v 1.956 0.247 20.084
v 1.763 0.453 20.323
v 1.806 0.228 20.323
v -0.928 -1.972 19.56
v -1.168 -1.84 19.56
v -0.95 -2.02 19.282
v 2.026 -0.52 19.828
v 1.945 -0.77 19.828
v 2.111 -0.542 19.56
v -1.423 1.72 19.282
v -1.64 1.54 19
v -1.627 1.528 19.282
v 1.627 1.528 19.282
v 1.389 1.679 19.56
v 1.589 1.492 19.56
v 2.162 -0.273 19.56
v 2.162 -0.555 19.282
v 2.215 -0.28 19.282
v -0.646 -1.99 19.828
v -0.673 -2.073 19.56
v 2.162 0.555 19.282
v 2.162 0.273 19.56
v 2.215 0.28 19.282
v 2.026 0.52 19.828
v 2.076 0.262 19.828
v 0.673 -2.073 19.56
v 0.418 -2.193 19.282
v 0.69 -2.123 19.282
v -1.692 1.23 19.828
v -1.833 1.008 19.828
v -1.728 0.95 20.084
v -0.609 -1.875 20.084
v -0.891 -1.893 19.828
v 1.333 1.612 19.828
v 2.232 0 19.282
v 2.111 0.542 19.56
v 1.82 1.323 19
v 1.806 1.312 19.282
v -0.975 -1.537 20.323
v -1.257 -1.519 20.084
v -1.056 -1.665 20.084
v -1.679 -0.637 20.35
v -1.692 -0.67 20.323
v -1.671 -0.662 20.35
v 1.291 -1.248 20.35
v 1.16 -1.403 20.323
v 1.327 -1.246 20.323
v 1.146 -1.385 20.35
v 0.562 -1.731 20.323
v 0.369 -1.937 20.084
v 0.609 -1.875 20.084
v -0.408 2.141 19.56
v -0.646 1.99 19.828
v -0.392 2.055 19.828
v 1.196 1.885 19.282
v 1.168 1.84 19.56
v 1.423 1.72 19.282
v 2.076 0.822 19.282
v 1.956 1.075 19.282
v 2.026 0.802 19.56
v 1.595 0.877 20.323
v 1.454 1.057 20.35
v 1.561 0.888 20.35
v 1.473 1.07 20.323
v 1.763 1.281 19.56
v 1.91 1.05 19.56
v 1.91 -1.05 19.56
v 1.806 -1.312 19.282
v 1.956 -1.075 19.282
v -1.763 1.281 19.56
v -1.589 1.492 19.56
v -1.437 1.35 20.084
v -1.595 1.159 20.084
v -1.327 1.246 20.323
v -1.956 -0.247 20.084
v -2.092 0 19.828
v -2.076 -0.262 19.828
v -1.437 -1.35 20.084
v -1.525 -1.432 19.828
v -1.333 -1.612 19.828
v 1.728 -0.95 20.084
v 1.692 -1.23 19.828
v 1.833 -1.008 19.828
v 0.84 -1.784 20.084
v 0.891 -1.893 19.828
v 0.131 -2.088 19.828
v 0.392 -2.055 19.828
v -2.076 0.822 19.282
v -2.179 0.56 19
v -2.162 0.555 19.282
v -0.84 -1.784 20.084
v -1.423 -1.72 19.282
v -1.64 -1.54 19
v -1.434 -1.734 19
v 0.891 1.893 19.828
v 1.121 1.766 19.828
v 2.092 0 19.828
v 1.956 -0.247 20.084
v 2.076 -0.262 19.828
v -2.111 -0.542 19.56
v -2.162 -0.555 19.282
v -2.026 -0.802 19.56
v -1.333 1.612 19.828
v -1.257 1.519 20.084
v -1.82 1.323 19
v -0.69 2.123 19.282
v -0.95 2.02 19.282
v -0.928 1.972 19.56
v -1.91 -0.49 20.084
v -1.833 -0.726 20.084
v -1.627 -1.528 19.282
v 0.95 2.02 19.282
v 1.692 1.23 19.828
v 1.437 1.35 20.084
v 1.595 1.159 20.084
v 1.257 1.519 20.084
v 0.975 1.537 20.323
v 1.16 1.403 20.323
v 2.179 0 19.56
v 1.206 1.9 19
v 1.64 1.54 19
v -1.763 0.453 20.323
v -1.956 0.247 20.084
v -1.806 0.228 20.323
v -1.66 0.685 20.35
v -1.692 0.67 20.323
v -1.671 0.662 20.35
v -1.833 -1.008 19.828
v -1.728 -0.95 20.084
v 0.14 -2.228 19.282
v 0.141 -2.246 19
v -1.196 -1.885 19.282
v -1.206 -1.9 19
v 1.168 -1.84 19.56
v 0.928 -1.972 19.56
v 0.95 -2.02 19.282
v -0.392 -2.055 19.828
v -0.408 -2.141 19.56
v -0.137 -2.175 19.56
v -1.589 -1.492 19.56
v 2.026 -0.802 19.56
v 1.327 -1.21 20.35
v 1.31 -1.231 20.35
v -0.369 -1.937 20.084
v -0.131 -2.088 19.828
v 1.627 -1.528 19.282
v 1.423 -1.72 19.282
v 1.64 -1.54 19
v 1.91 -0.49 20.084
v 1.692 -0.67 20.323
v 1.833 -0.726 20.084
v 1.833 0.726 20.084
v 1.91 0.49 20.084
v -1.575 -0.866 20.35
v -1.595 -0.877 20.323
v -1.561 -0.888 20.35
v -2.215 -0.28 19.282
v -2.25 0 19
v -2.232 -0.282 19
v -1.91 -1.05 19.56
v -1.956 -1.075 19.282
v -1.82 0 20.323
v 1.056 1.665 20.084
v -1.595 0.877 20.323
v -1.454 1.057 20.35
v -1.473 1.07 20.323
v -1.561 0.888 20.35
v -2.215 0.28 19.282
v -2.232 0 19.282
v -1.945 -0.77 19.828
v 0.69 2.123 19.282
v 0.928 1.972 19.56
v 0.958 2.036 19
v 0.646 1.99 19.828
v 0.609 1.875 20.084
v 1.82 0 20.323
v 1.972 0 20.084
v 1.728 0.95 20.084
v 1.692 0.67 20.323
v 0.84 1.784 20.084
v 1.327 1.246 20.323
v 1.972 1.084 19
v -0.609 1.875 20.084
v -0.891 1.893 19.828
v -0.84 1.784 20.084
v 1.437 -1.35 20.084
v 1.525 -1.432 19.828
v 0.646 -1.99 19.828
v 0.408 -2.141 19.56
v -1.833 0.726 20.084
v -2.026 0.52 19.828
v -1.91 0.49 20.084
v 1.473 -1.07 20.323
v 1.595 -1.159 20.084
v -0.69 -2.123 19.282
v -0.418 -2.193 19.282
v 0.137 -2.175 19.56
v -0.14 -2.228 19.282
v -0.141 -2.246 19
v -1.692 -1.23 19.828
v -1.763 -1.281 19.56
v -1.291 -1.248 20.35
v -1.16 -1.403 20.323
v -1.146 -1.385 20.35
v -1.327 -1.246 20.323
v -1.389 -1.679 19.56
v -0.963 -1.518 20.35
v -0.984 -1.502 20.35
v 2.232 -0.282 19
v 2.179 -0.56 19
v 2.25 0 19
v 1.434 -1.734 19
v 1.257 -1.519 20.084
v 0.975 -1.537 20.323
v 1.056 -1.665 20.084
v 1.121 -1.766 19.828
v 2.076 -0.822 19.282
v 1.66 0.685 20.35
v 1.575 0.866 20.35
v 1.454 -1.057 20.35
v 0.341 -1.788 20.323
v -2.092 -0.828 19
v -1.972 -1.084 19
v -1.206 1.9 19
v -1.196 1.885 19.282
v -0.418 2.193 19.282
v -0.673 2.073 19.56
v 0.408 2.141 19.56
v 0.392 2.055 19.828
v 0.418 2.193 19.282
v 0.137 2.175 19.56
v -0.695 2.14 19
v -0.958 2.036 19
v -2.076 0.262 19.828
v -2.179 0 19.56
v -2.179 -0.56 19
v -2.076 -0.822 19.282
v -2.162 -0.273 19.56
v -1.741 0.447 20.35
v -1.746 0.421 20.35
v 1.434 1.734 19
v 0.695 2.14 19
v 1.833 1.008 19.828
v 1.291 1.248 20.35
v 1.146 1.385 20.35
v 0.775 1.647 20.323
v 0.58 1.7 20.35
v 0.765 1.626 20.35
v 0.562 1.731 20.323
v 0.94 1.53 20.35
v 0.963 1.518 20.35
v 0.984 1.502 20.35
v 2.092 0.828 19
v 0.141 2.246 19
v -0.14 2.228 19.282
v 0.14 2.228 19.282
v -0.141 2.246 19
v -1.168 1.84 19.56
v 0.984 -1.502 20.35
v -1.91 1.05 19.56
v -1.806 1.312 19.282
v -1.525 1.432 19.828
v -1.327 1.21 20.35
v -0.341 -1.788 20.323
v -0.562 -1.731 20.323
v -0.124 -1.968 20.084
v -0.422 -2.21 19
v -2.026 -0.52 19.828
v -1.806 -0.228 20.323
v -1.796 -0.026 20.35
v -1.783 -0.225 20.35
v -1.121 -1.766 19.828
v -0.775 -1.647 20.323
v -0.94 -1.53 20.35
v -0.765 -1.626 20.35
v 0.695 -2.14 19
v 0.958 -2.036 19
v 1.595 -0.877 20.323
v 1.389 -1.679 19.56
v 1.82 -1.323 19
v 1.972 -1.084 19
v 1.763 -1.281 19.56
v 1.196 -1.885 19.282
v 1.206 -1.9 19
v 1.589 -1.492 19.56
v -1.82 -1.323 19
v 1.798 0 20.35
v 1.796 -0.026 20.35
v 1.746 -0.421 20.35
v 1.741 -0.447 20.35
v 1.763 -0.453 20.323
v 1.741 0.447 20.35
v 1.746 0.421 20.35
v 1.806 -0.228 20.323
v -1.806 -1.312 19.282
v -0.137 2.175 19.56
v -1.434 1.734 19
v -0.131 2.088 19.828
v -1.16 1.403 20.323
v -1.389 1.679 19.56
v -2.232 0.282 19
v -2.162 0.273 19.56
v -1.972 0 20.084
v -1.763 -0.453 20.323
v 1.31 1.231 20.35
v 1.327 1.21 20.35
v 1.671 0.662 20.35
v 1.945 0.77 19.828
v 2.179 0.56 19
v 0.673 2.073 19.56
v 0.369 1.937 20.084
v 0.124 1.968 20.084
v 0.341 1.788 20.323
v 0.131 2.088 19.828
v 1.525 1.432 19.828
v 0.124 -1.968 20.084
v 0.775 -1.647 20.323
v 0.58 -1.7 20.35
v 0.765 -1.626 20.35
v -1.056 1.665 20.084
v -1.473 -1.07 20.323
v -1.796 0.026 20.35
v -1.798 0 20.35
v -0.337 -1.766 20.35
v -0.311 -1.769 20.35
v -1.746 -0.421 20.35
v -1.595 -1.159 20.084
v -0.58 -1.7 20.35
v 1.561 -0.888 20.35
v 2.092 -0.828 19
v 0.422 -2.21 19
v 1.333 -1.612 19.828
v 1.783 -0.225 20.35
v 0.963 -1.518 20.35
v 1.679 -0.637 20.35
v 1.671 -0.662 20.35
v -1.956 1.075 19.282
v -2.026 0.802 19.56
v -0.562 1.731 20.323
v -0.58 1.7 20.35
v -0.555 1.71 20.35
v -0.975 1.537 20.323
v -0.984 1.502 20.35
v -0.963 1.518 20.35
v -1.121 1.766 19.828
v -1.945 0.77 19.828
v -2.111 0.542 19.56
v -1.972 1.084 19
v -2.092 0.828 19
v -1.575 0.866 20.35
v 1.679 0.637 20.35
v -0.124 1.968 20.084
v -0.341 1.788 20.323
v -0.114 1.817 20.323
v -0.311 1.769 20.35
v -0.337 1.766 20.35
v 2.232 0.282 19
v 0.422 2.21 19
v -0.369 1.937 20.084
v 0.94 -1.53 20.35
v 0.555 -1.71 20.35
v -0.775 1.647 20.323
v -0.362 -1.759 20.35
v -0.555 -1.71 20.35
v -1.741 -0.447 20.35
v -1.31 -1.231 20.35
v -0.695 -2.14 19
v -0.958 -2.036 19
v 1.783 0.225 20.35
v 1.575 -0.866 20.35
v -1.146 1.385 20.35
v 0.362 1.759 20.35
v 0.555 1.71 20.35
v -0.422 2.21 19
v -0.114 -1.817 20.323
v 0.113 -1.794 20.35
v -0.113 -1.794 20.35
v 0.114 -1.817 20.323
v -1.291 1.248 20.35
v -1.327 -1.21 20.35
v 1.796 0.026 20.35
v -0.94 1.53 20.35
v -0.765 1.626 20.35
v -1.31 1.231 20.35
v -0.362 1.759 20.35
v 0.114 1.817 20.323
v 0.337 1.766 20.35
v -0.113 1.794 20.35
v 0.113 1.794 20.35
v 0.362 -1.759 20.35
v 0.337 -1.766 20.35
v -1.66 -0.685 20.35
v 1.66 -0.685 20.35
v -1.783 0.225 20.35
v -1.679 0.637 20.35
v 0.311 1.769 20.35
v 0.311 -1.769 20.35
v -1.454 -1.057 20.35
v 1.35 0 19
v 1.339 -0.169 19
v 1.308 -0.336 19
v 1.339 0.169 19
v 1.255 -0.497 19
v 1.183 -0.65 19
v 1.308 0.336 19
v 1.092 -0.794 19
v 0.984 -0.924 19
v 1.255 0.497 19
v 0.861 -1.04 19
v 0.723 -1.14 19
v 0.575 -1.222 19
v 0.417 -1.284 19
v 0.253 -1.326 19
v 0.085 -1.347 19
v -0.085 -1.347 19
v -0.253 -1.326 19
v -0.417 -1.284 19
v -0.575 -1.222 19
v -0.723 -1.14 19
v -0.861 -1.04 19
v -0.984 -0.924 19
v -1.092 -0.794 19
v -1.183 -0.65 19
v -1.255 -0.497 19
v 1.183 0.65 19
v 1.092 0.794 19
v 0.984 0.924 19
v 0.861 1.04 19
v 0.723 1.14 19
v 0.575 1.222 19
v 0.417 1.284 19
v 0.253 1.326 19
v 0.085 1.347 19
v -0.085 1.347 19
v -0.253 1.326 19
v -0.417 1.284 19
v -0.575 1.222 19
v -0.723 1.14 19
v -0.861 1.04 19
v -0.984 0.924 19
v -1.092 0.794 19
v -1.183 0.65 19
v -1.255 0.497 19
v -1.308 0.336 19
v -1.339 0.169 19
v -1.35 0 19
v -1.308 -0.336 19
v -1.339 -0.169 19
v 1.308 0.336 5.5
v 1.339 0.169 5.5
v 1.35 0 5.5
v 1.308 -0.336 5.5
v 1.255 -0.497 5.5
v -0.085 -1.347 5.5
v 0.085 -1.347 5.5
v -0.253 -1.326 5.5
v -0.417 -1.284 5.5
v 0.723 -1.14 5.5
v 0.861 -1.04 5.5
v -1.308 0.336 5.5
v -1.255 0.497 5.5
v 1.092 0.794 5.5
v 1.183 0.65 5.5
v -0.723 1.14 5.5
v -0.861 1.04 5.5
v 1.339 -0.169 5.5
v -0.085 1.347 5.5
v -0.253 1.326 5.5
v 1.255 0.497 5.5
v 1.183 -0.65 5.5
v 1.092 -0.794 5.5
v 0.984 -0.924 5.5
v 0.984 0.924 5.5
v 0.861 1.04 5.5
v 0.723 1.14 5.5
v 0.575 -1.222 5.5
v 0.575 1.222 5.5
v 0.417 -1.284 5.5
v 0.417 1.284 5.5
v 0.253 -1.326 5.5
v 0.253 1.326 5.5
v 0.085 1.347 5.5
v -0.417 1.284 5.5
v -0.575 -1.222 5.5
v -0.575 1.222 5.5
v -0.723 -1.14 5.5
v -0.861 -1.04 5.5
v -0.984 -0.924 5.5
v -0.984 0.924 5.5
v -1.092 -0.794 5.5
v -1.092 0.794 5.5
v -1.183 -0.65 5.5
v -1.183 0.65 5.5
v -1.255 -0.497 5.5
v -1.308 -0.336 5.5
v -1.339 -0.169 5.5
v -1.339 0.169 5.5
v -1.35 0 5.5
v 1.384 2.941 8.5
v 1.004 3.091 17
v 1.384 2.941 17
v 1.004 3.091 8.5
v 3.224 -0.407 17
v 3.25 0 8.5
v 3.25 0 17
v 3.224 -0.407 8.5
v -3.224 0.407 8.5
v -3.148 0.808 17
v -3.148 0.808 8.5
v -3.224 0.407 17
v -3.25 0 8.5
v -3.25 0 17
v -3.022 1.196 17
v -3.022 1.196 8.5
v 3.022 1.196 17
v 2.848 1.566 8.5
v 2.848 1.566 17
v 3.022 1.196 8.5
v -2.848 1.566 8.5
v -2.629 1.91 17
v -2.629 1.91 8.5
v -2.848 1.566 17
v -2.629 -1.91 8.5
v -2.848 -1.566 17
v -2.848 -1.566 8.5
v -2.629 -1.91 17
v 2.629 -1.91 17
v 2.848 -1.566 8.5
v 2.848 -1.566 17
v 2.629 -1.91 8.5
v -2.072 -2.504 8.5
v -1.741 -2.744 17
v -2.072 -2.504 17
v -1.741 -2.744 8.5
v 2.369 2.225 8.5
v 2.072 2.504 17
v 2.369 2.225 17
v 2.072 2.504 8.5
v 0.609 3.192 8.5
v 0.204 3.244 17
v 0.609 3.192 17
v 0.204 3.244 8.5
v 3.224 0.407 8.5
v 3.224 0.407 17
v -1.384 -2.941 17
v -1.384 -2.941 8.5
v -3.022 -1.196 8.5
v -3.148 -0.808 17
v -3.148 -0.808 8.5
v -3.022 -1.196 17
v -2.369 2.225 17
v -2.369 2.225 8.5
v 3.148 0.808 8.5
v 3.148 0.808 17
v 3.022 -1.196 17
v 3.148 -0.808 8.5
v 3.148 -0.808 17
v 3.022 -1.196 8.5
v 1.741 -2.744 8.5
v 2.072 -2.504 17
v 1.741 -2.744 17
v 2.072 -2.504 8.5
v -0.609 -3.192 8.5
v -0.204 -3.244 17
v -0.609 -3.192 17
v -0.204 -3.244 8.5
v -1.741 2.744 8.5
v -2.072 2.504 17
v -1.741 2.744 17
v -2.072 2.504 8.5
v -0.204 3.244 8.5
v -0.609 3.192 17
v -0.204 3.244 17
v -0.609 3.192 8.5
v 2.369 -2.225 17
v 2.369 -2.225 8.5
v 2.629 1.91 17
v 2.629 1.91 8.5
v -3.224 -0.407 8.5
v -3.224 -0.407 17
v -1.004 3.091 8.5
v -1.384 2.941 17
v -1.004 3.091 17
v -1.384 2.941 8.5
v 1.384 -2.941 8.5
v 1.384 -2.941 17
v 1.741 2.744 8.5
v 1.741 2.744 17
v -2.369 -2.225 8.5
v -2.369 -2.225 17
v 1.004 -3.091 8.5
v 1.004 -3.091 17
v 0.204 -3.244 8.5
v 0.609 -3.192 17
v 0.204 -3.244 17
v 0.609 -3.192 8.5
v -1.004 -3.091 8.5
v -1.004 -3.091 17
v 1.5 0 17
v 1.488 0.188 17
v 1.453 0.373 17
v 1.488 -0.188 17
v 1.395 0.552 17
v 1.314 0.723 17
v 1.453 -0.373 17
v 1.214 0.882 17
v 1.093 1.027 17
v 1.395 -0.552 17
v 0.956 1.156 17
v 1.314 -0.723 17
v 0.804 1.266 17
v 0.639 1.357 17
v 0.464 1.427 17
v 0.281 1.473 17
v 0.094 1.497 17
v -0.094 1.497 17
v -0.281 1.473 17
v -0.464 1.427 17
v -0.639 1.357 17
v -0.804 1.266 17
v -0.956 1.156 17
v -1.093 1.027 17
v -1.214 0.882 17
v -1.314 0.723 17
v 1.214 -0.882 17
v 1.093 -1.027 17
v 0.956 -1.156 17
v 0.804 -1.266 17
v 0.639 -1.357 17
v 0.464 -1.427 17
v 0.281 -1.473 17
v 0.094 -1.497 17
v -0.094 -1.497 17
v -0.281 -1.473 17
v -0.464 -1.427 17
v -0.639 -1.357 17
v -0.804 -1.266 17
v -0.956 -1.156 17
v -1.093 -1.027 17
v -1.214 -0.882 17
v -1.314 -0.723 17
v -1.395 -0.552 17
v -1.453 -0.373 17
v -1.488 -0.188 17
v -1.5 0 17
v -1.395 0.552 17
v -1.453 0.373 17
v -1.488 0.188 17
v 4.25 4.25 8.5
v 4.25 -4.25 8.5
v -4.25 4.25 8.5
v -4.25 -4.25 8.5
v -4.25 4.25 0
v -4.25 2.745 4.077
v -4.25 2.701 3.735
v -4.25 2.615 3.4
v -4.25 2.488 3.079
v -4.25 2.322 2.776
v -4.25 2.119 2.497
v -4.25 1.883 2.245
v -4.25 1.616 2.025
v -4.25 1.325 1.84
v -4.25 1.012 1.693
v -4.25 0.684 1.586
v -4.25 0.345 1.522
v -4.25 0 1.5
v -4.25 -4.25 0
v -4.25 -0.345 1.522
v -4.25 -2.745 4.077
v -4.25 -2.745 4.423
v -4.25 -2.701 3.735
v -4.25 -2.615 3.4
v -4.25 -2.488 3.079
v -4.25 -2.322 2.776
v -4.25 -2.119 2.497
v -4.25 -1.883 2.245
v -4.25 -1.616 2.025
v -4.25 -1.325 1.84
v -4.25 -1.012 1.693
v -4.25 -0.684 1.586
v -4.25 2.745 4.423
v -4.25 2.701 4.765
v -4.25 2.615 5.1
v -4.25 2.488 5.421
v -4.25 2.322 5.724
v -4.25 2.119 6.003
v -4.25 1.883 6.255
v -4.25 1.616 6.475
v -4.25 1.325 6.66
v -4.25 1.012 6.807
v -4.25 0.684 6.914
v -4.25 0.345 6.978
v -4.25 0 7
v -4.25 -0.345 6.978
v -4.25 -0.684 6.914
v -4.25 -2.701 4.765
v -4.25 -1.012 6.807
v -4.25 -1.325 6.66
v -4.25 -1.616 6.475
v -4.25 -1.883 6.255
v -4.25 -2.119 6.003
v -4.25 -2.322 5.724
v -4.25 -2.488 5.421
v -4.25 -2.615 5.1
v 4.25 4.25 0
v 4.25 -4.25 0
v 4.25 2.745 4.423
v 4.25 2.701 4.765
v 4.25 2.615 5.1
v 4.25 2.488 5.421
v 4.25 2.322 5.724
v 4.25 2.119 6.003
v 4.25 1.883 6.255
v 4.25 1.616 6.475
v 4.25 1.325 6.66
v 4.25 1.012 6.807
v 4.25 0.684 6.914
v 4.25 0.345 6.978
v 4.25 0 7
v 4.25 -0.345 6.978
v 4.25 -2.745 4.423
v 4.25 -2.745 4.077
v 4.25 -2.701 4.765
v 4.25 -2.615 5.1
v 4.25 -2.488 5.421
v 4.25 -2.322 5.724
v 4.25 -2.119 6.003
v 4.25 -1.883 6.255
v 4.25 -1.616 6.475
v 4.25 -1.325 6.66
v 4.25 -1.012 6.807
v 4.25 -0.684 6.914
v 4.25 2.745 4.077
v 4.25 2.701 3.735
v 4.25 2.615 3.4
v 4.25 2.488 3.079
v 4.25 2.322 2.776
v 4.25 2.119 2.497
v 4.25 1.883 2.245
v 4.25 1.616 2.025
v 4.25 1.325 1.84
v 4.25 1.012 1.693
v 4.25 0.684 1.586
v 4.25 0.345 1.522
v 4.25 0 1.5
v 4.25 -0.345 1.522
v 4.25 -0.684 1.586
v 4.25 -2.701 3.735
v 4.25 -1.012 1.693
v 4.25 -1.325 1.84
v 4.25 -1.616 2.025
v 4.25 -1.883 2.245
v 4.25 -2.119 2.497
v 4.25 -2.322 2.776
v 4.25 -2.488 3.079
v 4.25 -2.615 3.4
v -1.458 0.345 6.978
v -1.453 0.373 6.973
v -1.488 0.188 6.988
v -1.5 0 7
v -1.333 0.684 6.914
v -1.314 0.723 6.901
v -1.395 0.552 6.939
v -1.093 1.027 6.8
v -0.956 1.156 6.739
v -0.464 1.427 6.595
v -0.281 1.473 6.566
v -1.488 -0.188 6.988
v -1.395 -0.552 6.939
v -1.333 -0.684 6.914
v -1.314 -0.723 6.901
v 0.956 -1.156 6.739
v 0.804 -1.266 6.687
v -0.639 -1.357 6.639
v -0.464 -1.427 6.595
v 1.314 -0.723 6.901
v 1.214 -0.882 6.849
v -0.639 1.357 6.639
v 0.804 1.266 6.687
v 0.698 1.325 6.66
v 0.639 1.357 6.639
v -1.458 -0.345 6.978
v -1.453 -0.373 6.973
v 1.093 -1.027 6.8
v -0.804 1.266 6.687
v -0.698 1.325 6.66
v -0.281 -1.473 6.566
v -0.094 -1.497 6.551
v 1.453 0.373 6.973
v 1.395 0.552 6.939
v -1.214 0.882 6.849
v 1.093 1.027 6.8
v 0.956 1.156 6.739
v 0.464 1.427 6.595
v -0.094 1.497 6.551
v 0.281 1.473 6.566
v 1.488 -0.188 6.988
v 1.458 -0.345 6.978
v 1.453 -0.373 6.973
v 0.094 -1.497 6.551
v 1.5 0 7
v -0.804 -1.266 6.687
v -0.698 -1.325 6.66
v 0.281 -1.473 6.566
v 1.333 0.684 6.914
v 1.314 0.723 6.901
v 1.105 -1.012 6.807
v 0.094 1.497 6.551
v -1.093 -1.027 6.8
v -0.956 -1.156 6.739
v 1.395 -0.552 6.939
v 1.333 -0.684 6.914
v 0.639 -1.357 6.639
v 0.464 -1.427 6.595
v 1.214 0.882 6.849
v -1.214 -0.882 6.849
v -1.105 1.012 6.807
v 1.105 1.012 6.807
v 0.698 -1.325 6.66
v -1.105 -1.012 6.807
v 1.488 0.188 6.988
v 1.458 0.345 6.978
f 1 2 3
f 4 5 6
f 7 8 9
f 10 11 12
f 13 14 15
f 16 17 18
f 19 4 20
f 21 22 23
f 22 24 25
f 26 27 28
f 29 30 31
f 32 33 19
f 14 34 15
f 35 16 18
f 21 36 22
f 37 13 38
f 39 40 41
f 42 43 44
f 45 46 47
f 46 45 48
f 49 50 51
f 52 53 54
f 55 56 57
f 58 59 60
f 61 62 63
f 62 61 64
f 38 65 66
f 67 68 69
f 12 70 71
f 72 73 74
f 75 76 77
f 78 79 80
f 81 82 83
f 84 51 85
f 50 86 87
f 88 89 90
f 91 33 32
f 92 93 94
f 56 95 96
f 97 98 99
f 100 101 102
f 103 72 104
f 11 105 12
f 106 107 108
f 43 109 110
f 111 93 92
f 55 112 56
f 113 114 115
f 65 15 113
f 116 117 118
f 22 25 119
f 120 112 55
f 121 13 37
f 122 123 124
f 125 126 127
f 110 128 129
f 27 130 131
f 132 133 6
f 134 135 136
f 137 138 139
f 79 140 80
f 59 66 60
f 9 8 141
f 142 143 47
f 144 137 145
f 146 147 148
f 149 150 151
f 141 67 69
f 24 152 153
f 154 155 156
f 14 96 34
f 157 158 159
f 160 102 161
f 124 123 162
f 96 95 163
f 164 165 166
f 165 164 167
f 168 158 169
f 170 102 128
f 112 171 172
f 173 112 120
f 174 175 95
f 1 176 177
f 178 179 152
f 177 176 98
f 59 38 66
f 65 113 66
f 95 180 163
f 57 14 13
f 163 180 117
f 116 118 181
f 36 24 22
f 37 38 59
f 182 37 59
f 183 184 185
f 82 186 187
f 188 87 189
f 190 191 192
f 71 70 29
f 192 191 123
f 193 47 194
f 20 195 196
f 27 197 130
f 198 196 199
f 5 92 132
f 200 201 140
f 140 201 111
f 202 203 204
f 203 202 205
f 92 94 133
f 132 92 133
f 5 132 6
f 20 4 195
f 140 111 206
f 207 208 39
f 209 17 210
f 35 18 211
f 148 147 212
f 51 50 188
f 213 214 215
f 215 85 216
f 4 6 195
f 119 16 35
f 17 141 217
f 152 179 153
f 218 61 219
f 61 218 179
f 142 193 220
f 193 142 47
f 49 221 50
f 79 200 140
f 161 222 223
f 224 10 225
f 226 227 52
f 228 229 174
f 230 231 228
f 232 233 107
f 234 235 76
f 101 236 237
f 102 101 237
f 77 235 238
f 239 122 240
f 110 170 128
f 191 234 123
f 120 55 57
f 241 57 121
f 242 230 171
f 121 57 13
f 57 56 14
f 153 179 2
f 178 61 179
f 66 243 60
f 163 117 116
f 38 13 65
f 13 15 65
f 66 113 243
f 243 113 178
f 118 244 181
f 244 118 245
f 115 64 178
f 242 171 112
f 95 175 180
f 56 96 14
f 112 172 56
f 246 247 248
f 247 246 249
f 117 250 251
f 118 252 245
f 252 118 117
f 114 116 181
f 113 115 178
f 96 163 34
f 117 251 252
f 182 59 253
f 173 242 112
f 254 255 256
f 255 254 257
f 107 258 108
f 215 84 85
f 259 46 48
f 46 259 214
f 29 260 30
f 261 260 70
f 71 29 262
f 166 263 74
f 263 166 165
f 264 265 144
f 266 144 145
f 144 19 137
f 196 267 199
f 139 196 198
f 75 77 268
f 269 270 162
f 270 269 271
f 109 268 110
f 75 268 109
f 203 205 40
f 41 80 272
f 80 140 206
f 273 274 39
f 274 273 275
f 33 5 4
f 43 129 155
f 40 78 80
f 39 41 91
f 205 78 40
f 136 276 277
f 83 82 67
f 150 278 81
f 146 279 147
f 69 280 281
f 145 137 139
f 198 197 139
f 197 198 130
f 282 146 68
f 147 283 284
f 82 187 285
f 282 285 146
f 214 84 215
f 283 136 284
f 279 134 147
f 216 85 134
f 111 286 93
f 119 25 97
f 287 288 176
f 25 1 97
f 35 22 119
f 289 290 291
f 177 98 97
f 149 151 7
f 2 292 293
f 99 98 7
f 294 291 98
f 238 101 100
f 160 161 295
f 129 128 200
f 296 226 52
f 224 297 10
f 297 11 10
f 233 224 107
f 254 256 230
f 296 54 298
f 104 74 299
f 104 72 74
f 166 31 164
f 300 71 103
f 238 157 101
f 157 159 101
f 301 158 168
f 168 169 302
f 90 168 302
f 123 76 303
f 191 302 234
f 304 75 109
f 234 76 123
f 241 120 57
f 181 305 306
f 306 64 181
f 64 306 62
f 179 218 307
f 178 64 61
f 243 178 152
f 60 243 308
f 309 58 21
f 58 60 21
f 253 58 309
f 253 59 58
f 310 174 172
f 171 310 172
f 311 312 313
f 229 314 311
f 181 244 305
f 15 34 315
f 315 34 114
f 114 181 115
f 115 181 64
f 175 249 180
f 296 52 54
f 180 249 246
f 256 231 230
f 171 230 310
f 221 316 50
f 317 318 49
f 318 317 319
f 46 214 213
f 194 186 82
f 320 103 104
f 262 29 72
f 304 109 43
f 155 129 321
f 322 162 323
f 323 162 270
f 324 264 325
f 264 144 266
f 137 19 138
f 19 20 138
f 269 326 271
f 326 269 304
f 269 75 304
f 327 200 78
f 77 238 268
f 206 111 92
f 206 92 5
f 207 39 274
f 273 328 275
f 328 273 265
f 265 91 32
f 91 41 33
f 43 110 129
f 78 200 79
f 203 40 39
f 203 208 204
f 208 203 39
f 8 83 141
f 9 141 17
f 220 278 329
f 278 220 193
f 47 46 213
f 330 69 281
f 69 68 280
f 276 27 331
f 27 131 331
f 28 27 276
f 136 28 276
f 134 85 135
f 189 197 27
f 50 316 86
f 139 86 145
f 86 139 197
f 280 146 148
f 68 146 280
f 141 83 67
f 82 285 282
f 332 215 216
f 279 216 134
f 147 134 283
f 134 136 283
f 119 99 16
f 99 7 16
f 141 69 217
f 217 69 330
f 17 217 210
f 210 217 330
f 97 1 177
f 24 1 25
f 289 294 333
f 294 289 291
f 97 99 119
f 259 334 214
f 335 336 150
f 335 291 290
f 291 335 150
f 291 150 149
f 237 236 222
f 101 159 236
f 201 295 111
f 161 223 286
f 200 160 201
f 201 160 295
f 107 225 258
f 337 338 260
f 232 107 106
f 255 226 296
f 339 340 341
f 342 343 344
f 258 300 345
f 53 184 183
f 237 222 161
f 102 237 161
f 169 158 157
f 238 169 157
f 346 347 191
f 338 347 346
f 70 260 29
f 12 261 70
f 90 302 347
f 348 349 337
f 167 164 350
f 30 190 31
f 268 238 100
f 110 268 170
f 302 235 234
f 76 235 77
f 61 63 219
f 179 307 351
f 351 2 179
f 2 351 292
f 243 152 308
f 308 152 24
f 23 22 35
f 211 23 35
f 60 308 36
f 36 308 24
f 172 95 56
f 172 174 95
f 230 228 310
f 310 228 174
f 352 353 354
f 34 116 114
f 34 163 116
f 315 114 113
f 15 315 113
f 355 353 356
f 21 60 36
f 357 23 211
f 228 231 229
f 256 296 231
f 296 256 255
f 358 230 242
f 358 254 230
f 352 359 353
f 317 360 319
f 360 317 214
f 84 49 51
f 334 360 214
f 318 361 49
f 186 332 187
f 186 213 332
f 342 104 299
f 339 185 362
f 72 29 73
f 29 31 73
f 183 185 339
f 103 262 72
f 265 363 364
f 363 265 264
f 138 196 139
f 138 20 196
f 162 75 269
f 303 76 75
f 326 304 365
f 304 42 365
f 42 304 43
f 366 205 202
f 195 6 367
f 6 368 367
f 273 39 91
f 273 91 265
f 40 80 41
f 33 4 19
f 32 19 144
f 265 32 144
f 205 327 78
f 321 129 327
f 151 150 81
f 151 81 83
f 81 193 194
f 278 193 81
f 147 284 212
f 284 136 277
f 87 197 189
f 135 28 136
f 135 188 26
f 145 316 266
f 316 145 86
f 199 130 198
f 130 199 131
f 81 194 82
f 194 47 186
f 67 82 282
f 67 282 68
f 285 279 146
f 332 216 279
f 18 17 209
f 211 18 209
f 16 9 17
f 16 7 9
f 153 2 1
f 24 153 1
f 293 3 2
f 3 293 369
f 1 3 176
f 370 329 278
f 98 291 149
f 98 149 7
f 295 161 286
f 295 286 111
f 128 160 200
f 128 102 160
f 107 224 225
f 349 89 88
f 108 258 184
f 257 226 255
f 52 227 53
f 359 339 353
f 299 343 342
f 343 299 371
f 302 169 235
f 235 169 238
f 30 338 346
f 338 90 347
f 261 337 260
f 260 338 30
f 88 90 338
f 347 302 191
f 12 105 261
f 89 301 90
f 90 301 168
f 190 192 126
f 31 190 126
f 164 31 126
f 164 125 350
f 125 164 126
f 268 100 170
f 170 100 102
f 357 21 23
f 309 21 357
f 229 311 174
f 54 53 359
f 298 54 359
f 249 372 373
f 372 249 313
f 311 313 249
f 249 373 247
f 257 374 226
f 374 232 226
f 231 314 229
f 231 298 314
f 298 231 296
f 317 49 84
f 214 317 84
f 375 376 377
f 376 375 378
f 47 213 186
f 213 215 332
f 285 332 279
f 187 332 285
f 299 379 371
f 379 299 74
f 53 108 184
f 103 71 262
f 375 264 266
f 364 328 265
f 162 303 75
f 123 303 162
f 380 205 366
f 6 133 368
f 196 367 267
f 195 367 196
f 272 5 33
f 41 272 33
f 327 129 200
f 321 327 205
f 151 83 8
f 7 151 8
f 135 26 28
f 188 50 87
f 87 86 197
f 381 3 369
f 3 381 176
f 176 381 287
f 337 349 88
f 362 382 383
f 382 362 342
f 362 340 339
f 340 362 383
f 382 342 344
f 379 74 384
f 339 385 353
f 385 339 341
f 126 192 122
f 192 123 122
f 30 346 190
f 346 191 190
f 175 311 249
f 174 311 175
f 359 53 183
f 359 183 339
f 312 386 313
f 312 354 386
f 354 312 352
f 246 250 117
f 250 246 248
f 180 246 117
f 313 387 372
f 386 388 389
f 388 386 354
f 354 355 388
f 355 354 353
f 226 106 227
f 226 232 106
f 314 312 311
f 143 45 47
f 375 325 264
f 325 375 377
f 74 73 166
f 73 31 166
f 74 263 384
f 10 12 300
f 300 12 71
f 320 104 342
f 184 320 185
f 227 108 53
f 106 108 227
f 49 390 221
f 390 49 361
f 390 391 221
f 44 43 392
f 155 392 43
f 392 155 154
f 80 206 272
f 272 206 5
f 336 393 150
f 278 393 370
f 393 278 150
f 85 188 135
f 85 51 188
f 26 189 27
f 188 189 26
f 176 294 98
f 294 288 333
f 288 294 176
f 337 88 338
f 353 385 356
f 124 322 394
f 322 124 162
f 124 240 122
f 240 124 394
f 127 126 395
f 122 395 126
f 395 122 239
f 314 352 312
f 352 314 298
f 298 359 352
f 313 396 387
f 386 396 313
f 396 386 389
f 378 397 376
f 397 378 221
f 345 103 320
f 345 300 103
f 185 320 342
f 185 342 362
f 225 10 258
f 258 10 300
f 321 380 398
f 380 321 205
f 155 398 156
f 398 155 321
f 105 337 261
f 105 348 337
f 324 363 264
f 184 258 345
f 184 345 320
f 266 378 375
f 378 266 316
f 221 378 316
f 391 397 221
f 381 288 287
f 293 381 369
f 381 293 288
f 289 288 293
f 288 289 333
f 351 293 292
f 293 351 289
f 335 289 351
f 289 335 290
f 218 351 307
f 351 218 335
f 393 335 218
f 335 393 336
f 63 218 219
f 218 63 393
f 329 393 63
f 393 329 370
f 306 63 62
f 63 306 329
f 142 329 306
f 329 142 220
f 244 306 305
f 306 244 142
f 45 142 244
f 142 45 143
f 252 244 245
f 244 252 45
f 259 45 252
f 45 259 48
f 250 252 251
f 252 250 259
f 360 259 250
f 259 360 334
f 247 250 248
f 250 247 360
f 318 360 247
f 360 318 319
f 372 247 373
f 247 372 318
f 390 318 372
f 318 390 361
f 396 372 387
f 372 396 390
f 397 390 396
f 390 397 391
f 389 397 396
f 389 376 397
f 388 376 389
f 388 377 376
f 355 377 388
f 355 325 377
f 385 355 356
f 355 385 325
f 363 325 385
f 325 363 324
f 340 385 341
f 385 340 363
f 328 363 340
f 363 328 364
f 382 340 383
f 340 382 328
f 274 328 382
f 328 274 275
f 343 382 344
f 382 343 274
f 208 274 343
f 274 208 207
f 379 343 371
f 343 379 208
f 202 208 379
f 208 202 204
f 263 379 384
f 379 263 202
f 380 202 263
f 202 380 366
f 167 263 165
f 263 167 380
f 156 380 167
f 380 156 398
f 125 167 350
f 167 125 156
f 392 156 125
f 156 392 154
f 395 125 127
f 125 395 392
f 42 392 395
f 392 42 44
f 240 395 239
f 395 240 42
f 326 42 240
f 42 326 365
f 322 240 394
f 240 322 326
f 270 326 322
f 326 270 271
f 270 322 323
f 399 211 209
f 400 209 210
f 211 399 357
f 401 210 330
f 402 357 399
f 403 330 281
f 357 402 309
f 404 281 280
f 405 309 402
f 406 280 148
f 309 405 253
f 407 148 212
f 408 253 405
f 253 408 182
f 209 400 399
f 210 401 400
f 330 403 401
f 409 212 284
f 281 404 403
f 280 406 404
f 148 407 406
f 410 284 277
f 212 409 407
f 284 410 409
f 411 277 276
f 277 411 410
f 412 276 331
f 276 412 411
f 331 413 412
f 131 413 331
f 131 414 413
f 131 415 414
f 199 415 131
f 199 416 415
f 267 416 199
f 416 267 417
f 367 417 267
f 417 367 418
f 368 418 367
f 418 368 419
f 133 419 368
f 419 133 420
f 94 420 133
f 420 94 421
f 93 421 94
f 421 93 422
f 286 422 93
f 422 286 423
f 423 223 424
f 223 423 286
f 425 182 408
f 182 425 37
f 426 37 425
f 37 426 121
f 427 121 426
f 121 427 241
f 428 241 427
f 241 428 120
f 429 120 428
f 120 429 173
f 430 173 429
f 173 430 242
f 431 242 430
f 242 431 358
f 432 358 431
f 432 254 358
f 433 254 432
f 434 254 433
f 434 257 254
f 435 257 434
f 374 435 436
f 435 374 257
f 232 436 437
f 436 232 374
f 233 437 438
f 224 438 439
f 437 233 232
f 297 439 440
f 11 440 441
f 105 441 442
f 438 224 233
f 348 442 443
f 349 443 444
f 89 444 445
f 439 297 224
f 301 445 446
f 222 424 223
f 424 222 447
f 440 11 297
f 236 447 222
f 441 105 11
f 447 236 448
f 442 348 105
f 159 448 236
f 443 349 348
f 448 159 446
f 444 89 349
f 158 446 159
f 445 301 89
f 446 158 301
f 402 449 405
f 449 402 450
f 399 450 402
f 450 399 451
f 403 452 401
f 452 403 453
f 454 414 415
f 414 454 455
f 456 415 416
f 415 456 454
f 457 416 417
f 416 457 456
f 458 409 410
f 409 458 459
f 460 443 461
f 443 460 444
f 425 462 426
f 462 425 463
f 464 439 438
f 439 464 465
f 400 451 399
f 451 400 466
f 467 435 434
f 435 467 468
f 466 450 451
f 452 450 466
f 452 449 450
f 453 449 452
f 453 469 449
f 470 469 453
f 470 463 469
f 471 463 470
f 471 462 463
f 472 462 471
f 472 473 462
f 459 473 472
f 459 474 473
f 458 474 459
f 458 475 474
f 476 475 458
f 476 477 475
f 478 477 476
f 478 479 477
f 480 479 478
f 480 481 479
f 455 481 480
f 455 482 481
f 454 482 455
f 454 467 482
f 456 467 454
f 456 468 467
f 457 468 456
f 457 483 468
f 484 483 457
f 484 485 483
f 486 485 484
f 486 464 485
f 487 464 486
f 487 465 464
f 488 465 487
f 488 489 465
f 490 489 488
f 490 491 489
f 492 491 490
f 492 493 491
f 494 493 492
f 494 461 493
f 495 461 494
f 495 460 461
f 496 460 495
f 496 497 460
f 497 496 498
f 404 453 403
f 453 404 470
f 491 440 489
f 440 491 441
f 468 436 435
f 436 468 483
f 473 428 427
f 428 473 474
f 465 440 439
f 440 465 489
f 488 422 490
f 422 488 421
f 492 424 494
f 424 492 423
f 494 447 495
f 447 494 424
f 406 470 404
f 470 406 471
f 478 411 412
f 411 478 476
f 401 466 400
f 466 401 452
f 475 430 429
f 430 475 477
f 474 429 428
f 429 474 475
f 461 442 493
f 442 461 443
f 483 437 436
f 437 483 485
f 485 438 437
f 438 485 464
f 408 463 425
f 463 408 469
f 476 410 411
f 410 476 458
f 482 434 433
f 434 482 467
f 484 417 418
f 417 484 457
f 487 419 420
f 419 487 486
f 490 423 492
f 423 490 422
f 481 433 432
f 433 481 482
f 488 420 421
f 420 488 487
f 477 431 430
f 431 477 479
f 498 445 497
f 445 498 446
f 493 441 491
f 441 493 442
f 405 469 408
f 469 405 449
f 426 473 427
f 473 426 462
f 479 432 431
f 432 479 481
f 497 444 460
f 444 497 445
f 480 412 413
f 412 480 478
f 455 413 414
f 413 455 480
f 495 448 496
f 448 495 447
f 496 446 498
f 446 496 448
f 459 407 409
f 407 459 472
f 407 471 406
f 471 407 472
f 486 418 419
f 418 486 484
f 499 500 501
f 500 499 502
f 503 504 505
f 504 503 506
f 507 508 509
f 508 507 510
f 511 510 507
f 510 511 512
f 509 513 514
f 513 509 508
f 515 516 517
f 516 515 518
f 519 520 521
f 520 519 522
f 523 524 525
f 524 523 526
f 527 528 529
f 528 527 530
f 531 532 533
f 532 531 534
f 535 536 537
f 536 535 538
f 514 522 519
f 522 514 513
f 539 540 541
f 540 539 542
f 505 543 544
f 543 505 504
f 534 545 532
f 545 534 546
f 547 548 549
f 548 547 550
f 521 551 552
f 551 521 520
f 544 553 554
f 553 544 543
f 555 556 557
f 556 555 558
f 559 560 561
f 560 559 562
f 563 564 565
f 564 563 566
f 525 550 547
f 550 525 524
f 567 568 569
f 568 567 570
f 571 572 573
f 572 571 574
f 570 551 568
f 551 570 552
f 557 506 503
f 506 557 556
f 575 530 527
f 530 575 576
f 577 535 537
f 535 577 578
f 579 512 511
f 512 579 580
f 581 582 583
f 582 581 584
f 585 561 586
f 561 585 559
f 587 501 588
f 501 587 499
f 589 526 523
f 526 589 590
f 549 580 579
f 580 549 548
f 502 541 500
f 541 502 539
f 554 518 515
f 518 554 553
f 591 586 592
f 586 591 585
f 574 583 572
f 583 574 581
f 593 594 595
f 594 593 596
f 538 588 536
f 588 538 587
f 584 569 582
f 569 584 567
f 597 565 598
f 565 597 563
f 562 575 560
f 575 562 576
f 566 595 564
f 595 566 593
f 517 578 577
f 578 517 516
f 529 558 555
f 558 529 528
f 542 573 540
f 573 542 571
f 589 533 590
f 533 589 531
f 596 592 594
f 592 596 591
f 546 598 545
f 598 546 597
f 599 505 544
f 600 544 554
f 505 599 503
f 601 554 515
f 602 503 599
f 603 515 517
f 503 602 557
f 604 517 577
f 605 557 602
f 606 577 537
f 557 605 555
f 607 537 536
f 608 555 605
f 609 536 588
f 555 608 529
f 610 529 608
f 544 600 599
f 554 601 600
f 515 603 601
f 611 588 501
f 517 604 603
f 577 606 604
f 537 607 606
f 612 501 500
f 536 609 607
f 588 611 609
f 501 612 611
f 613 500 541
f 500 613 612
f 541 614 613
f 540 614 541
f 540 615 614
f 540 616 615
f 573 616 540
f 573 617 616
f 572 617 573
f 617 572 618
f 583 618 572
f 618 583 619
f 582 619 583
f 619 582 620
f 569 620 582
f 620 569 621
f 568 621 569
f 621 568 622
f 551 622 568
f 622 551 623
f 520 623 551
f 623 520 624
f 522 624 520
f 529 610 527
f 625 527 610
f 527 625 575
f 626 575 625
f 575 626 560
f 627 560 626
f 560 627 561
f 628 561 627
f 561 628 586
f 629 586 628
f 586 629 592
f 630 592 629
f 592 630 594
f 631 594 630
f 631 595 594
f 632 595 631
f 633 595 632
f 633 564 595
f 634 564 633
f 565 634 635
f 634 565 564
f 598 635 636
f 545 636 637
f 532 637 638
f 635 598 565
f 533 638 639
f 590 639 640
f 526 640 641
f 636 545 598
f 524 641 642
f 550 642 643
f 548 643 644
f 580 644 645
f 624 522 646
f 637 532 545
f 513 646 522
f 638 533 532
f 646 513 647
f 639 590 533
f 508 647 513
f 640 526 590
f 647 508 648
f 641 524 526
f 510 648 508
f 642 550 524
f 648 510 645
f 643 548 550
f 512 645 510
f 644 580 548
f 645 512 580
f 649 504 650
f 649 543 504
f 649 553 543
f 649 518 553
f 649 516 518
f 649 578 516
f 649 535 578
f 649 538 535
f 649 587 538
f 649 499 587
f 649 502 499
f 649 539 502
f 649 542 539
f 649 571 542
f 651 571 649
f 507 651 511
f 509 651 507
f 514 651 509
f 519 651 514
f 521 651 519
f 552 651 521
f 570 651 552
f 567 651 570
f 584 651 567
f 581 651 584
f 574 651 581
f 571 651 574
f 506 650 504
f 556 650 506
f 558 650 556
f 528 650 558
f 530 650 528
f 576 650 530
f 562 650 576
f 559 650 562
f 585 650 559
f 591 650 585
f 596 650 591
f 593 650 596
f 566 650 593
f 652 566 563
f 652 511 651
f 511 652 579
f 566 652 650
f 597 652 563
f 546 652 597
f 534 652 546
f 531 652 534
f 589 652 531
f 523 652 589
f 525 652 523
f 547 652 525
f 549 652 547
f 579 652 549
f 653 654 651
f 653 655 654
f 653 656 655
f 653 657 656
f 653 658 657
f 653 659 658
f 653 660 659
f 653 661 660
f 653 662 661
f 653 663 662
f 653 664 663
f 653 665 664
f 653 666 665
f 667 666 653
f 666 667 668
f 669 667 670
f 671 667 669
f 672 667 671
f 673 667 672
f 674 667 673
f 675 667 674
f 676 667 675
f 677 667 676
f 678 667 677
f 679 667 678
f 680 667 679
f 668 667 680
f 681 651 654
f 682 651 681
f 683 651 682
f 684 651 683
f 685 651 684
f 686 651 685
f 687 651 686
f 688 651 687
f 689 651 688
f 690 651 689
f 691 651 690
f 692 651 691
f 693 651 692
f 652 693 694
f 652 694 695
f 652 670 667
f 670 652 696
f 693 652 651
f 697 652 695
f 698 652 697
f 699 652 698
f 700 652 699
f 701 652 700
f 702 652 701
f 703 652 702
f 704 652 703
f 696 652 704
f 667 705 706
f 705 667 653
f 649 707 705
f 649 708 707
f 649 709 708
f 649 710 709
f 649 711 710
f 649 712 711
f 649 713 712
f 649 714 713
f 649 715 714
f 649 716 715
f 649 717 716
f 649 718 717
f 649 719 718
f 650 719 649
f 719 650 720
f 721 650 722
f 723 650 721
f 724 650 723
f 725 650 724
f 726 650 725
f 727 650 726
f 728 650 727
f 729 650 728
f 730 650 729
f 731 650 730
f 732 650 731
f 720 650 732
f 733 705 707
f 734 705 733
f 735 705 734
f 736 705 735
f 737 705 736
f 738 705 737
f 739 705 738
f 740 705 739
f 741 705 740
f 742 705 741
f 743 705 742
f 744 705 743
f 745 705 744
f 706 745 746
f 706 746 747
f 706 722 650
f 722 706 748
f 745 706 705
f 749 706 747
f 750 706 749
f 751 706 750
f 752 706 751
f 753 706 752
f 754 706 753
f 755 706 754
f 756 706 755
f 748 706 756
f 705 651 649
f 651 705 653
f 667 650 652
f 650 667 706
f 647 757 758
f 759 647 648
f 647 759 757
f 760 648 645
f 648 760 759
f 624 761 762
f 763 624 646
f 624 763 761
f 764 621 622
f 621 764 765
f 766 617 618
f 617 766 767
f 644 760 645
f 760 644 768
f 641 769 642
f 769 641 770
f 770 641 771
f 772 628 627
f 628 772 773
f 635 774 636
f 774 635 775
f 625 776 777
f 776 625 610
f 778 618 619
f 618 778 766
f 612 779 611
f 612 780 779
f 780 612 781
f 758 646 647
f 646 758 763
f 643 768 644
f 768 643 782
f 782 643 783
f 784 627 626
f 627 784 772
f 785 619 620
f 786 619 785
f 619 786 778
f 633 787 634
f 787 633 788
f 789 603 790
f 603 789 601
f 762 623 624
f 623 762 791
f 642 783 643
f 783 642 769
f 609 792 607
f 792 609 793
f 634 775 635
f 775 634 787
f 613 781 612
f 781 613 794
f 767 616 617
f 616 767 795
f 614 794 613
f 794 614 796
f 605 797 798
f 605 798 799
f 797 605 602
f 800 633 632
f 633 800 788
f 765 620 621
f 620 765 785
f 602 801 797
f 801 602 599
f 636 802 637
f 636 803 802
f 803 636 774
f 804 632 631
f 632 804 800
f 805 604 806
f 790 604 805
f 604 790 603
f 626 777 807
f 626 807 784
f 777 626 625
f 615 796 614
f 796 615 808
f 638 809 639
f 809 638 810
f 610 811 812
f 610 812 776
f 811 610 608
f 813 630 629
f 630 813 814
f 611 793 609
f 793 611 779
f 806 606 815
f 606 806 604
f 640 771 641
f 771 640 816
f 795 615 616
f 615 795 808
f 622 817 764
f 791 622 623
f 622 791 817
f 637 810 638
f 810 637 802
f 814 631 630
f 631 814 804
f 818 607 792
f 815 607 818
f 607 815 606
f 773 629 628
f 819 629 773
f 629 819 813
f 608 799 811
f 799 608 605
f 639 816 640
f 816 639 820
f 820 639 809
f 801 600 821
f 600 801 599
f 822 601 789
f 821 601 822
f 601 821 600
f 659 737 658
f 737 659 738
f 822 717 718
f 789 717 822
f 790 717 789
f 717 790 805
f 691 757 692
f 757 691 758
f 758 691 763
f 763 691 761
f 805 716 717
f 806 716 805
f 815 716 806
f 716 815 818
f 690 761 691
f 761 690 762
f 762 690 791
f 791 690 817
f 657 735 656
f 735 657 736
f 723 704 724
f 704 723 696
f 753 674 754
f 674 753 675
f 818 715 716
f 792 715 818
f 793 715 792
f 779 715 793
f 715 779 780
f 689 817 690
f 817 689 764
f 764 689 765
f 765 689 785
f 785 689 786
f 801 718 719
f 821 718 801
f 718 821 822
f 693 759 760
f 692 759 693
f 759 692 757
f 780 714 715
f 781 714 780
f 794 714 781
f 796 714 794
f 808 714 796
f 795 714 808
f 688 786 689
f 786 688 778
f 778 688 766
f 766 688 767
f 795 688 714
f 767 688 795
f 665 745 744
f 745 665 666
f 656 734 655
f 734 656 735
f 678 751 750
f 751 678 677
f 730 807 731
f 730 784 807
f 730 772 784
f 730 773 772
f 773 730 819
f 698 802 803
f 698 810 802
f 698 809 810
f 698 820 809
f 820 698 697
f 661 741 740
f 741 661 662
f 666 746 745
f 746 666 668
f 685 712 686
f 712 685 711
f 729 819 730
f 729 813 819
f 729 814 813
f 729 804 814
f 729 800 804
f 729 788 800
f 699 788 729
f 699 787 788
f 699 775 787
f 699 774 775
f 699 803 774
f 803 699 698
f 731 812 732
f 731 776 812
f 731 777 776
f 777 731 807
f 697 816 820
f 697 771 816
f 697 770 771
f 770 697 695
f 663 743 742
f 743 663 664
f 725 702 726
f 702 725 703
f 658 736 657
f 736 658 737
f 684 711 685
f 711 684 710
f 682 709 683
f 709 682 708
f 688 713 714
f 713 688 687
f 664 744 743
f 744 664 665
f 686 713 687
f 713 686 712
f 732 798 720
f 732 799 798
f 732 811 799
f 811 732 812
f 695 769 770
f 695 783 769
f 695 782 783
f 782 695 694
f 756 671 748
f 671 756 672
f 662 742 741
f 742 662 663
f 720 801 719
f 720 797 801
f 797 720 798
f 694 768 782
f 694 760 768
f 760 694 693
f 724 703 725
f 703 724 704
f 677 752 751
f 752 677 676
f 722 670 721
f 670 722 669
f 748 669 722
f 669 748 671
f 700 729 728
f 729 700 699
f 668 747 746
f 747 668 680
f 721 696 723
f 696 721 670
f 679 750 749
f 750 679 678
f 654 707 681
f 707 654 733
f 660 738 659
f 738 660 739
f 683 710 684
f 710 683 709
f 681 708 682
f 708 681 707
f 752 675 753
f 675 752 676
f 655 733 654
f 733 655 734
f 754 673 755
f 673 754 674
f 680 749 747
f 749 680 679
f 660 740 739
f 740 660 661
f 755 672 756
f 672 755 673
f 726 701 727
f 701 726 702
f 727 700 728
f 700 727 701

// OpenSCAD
/* Replacement part for plughole actuator
 *
 * Brian Starkey <stark3y@gmail.com>
 * Creative Commons BY-NC-SA
 */

$fn = 50;
outside_dia = 6.5;
sheathed_height = 8.5;
bolt_dia = 3;
block_size = sheathed_height;
pole_dia = 5.5;

steel_grey = [0.7, 0.7, 0.7];

module bolt(length = 10, dia = 3) {
	radius = (dia / 2) * 0.9;

	color(steel_grey) {
		translate([0, 0, length]) intersection() {
			sphere(r = radius + 0.9, center = true);
			translate([0, 0, radius / 2])
				cube([5, 5, radius], center = true);
		}
		cylinder(r = radius, h = length);
	}
}

module axle(length = 10) {
	color(steel_grey) cylinder(r = 1, h = length, center = true);
}

module plug_insert_part()
{
	translate([0, 0, sheathed_height * 2]) rotate([0, 180, 0])
	difference() {
		union() {
			cylinder(r = outside_dia / 2, h = sheathed_height);
			translate([0, 0, sheathed_height * 1.5])
				cube(sheathed_height, center = true);
		}
		union () {
			translate([0, 0, -0.5])
				cylinder(r = bolt_dia / 2, h = (sheathed_height * (3 / 2)) + 1);
			translate([0, 0, (sheathed_height * 1.5)]) rotate([0, 90, 0])
				cylinder(r = pole_dia / 2, h = sheathed_height + 1, center = true);
		}
	}
}

translate([0, 0, pole_dia])
	bolt(length = sheathed_height + 5);
plug_insert_part();
